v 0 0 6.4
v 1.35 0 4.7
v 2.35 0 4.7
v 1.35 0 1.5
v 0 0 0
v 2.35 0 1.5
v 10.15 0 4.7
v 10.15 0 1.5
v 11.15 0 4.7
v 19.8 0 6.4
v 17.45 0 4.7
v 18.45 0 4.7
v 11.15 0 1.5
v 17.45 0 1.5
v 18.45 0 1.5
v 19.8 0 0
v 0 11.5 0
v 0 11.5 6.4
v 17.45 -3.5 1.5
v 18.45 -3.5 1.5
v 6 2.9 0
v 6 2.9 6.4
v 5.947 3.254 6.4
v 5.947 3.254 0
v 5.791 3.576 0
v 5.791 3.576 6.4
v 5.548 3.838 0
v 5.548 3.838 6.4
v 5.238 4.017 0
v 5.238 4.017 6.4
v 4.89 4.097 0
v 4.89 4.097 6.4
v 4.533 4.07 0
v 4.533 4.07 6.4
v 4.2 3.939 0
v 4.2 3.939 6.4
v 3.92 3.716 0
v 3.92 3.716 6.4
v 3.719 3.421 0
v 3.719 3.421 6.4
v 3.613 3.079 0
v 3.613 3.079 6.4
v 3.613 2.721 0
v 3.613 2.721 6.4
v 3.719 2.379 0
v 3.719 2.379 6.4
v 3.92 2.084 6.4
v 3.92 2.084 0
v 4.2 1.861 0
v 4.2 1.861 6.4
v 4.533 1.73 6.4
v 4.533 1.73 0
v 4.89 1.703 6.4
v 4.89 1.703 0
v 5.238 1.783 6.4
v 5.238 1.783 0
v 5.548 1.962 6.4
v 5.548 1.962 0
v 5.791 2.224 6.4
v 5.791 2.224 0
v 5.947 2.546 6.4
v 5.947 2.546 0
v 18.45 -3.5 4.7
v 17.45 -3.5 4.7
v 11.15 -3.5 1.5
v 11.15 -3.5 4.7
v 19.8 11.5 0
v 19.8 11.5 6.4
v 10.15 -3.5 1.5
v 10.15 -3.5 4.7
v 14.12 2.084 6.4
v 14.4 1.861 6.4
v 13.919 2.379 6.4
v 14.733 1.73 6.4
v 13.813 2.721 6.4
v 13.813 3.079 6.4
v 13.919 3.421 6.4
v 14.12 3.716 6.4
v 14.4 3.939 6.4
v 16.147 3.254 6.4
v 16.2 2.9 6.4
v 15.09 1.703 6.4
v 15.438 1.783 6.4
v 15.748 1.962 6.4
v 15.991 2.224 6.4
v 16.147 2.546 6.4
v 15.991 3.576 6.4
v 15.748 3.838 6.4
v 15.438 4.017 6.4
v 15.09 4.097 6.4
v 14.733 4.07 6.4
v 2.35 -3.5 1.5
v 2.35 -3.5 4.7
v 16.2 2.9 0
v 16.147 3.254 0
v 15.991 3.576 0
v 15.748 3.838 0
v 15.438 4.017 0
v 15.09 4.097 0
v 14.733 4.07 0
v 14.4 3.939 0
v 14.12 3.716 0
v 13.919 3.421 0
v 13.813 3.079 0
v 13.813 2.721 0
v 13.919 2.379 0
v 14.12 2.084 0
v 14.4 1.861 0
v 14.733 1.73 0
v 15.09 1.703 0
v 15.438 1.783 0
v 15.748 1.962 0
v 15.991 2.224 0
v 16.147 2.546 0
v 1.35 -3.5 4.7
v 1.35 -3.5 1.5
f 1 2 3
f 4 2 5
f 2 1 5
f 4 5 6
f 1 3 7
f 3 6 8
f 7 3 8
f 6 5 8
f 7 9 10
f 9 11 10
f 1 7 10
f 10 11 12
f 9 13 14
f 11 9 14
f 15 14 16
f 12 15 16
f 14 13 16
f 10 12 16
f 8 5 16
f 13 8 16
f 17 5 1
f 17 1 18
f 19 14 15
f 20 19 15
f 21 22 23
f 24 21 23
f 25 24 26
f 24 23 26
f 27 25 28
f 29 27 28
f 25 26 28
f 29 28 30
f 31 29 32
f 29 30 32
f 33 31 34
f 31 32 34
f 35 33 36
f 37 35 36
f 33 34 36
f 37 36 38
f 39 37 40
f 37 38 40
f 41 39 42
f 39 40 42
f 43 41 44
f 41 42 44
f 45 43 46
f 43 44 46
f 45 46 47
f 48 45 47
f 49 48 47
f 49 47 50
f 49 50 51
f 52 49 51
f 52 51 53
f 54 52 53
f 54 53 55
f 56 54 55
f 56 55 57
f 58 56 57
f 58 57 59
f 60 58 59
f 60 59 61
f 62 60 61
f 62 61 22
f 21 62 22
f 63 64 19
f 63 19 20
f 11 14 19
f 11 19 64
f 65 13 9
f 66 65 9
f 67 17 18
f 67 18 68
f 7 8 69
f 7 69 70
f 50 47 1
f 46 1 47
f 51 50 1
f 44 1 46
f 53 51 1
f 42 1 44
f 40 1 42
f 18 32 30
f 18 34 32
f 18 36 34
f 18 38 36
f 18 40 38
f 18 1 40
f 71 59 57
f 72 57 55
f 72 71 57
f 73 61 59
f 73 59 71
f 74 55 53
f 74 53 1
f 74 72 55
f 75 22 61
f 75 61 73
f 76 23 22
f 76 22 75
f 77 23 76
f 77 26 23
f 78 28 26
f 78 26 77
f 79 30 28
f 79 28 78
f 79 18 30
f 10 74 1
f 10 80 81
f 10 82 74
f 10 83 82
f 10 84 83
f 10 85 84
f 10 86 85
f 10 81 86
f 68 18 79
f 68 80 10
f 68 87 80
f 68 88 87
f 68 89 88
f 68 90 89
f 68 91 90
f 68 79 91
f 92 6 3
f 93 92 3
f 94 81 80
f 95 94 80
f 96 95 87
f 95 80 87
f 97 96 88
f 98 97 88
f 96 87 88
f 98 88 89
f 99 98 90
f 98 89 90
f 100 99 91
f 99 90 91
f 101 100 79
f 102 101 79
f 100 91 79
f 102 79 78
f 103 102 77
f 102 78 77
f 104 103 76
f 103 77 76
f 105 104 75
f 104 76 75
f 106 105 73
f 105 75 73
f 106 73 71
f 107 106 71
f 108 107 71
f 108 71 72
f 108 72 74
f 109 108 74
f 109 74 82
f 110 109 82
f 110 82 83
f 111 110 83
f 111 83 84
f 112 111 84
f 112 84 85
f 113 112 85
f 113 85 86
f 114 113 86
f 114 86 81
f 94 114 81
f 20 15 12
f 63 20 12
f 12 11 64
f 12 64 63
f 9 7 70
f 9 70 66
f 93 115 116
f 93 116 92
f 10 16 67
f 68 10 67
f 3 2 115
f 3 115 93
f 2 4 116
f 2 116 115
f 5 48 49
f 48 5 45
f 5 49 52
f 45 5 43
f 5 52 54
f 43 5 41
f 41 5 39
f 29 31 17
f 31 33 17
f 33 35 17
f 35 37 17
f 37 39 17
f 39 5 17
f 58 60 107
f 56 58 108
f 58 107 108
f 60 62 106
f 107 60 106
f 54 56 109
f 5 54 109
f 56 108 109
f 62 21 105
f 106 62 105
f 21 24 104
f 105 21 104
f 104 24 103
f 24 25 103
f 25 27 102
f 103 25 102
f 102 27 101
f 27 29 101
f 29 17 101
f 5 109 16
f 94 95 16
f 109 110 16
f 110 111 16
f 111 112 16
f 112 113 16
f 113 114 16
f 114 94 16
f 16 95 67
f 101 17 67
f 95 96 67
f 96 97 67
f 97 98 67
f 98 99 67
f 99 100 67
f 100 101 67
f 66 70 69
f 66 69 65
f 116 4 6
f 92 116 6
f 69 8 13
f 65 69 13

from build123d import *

# Parameters (mm, degrees)
SKETCH_W     = 19.8
SKETCH_H     = 11.5
PAD_DEPTH    = 6.4
SKETCH001_R  = 1.2
POCKET_DEPTH = 6.401
SKETCH002_W  = 1
SKETCH002_H  = 3.2
PAD001_DEPTH = 3.5


with BuildPart() as part:
    # Sketch → Pad (new body)
    with BuildSketch(Plane.XY):
        with Locations((9.9, 5.75)):
            Rectangle(SKETCH_W, SKETCH_H)
    extrude(amount=PAD_DEPTH)

    # Sketch001 → Pocket (cut, through all)
    with BuildSketch(Plane.XY.offset(6.4)):
        with Locations((4.8, 2.9)):
            Circle(SKETCH001_R)
        with Locations((15, 2.9)):
            Circle(SKETCH001_R)
    extrude(amount=-POCKET_DEPTH, mode=Mode.SUBTRACT)

    # Sketch002 → Pad001 (new body)
    with BuildSketch(Plane.XZ):
        with Locations((1.85, 3.1)):
            Rectangle(SKETCH002_W, SKETCH002_H)
        with Locations((10.65, 3.1)):
            Rectangle(SKETCH002_W, SKETCH002_H)
        with Locations((17.95, 3.1)):
            Rectangle(SKETCH002_W, SKETCH002_H)
    extrude(amount=PAD001_DEPTH)


solid = part.part
